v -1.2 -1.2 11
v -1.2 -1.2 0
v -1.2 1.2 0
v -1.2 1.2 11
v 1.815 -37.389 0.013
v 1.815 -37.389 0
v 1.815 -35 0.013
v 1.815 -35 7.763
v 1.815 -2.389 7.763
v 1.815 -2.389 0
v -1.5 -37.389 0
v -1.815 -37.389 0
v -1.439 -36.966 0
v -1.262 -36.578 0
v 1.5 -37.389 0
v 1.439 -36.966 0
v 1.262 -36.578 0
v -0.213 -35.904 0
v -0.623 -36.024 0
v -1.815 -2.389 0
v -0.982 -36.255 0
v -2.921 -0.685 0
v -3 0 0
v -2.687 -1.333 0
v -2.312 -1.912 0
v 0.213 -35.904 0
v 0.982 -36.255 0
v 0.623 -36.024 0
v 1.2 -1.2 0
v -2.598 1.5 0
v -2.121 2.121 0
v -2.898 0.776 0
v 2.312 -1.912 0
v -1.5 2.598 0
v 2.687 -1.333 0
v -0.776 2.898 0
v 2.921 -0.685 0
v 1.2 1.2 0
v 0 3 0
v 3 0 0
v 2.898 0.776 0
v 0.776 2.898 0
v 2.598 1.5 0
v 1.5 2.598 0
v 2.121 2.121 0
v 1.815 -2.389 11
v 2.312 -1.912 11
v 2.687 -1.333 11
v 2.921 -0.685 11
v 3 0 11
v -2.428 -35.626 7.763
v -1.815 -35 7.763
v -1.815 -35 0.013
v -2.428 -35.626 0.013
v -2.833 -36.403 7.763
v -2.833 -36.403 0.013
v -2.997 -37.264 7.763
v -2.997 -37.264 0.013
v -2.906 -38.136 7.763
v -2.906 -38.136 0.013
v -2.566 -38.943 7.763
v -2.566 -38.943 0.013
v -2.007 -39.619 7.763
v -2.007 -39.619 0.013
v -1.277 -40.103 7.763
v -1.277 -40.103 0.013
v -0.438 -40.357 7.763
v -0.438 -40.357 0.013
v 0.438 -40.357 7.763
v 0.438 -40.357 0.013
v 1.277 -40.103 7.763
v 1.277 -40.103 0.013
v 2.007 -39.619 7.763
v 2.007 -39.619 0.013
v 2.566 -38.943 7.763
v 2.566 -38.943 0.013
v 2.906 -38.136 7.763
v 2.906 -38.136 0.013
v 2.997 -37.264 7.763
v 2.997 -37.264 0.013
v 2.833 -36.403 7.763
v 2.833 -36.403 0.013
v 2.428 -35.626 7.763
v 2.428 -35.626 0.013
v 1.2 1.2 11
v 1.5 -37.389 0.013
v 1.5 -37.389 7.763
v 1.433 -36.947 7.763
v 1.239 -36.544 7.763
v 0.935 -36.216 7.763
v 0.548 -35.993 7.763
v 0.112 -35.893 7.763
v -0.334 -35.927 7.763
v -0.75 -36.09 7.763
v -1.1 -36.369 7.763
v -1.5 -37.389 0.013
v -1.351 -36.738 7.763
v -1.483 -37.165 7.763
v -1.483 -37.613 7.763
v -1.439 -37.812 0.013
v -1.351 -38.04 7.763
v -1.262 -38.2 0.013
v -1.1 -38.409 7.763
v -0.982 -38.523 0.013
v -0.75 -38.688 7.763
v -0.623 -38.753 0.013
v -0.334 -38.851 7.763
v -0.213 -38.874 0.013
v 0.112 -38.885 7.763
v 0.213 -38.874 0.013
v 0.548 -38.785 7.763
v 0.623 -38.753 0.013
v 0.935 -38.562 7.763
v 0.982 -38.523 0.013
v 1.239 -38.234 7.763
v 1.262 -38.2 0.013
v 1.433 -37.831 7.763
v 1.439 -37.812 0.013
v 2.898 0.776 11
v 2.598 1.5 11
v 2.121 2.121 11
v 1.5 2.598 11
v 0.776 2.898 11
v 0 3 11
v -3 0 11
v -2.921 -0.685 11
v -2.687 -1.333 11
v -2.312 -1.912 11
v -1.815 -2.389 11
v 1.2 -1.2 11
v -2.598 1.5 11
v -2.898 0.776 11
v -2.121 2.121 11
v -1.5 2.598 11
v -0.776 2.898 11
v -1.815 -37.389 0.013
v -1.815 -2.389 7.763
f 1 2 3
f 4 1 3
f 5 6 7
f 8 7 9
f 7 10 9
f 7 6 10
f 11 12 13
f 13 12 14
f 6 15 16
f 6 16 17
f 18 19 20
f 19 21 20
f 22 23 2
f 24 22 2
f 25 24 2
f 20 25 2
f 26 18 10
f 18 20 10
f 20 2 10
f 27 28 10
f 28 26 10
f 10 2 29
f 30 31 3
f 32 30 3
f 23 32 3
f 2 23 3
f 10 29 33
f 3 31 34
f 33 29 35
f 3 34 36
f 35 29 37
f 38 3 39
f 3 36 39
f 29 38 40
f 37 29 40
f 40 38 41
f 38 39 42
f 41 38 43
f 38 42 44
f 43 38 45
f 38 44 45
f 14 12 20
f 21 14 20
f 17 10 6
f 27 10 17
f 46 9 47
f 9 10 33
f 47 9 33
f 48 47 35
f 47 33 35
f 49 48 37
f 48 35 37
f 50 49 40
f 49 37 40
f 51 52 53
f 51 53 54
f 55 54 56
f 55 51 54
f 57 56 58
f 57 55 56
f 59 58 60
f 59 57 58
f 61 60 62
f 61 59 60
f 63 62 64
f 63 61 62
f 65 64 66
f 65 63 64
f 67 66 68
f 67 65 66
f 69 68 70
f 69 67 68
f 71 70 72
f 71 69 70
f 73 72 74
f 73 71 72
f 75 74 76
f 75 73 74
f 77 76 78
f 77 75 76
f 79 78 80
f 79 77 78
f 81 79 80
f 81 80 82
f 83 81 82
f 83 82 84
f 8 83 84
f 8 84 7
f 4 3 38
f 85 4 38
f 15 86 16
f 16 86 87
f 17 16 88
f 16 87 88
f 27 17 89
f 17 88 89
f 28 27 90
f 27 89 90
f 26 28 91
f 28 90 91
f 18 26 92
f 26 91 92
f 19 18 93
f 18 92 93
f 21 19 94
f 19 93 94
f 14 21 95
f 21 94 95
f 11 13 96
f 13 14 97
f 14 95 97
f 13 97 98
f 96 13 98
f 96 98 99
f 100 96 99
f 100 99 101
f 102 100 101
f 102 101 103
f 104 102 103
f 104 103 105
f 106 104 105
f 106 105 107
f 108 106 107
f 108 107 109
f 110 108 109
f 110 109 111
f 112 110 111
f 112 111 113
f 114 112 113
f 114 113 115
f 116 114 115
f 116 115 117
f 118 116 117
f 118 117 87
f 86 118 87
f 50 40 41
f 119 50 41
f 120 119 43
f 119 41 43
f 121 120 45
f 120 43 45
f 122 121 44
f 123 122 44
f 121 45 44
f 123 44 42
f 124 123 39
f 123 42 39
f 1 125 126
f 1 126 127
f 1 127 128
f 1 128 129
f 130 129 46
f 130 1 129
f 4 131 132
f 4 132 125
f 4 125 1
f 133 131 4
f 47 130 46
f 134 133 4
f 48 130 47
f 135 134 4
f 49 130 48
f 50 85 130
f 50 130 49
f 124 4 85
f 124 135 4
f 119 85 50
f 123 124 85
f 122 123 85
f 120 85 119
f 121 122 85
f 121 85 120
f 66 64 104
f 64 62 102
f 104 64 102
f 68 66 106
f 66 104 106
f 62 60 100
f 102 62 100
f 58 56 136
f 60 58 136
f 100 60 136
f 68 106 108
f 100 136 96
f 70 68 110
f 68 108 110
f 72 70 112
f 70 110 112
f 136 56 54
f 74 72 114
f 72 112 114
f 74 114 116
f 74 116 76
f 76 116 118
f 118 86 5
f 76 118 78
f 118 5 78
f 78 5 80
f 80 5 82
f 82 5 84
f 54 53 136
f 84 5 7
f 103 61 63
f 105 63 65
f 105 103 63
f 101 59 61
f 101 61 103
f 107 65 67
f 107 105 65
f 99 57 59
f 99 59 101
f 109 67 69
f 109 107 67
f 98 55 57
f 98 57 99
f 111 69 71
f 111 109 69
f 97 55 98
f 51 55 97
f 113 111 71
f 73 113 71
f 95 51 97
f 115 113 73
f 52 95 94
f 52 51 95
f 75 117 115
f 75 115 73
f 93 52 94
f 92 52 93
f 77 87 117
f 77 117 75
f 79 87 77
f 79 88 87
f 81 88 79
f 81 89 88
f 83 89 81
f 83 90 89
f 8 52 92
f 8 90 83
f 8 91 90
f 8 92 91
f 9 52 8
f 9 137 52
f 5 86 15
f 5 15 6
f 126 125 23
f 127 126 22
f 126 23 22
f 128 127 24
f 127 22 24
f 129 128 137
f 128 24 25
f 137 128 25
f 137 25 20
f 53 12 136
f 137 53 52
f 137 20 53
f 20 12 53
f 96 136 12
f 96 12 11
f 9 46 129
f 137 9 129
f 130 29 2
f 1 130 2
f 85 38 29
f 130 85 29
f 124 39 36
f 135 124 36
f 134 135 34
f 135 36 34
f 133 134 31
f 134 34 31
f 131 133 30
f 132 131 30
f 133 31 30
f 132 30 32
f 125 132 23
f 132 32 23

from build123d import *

# Parameters (mm, degrees)
F1_DEPTH = 11
F3_DEPTH = 25
F4_W     = 3.629314
F4_H     = 7.762888
F5_DEPTH = 35
F6_R     = 3
F7_DEPTH = 7.75
F8_R     = 1.5
F9_DEPTH = 25


with BuildPart() as f1:
    # F0 (on Top) → F1 (new body)
    with BuildSketch(Plane.XY):
        with BuildLine():
            Line((1.2, 0), (3, 0))
            ThreePointArc((3, 0), (2.12132, 2.12132), (0, 3))
            Line((0, 3), (0, 1.2))
            Line((0, 1.2), (1.2, 1.2))
            Line((1.2, 1.2), (1.2, 1.0315))
            Line((1.2, 1.0315), (1.2, 0.863))
            Line((1.2, 0.863), (1.2, 0))
        make_face()
        with BuildLine():
            ThreePointArc((0, -3), (2.12132, -2.12132), (3, 0))
            Line((3, 0), (1.2, 0))
            Line((1.2, 0), (1.2, -1.2))
            Line((1.2, -1.2), (0, -1.2))
            Line((0, -1.2), (0, -3))
        make_face()
        with BuildLine():
            Line((0, 1.2), (0, 3))
            ThreePointArc((0, 3), (-2.12132, 2.12132), (-3, 0))
            Line((-3, 0), (-1.2, 0))
            Line((-1.2, 0), (-1.2, 1.0315))
            Line((-1.2, 1.0315), (-1.2, 1.2))
            Line((-1.2, 1.2), (0, 1.2))
        make_face()
        with BuildLine():
            ThreePointArc((-3, 0), (-2.12132, -2.12132), (0, -3))
            Line((0, -3), (0, -1.2))
            Line((0, -1.2), (-1.2, -1.2))
            Line((-1.2, -1.2), (-1.2, 0))
            Line((-1.2, 0), (-3, 0))
        make_face()
    extrude(amount=F1_DEPTH)

    # F2 (on face) → F3 (cut)
    with BuildSketch(Plane.XY.offset(11)):
        with BuildLine():
            Line((1.814657, -2.388937), (-1.814657, -2.388937))
            ThreePointArc((-1.814657, -2.388937), (0, -3), (1.814657, -2.388937))
        make_face()
    extrude(amount=-F3_DEPTH, mode=Mode.SUBTRACT)

    # F4 (on face) → F5 (join)
    with BuildSketch(Plane.XZ.offset(2.388937)):
        with Locations((0, 3.881444)):
            Rectangle(F4_W, F4_H)
    extrude(amount=F5_DEPTH)

    # F6 (on face) → F7 (join)
    with BuildSketch(Plane.XY.offset(7.762888)):
        with Locations((0, -37.388937)):
            Circle(F6_R)
    extrude(amount=-F7_DEPTH)

    # F8 (on face) → F9 (cut)
    with BuildSketch(Plane.XY.offset(7.762888)):
        with Locations((0, -37.388937)):
            Circle(F8_R)
    extrude(amount=-F9_DEPTH, mode=Mode.SUBTRACT)


solid = f1.part
